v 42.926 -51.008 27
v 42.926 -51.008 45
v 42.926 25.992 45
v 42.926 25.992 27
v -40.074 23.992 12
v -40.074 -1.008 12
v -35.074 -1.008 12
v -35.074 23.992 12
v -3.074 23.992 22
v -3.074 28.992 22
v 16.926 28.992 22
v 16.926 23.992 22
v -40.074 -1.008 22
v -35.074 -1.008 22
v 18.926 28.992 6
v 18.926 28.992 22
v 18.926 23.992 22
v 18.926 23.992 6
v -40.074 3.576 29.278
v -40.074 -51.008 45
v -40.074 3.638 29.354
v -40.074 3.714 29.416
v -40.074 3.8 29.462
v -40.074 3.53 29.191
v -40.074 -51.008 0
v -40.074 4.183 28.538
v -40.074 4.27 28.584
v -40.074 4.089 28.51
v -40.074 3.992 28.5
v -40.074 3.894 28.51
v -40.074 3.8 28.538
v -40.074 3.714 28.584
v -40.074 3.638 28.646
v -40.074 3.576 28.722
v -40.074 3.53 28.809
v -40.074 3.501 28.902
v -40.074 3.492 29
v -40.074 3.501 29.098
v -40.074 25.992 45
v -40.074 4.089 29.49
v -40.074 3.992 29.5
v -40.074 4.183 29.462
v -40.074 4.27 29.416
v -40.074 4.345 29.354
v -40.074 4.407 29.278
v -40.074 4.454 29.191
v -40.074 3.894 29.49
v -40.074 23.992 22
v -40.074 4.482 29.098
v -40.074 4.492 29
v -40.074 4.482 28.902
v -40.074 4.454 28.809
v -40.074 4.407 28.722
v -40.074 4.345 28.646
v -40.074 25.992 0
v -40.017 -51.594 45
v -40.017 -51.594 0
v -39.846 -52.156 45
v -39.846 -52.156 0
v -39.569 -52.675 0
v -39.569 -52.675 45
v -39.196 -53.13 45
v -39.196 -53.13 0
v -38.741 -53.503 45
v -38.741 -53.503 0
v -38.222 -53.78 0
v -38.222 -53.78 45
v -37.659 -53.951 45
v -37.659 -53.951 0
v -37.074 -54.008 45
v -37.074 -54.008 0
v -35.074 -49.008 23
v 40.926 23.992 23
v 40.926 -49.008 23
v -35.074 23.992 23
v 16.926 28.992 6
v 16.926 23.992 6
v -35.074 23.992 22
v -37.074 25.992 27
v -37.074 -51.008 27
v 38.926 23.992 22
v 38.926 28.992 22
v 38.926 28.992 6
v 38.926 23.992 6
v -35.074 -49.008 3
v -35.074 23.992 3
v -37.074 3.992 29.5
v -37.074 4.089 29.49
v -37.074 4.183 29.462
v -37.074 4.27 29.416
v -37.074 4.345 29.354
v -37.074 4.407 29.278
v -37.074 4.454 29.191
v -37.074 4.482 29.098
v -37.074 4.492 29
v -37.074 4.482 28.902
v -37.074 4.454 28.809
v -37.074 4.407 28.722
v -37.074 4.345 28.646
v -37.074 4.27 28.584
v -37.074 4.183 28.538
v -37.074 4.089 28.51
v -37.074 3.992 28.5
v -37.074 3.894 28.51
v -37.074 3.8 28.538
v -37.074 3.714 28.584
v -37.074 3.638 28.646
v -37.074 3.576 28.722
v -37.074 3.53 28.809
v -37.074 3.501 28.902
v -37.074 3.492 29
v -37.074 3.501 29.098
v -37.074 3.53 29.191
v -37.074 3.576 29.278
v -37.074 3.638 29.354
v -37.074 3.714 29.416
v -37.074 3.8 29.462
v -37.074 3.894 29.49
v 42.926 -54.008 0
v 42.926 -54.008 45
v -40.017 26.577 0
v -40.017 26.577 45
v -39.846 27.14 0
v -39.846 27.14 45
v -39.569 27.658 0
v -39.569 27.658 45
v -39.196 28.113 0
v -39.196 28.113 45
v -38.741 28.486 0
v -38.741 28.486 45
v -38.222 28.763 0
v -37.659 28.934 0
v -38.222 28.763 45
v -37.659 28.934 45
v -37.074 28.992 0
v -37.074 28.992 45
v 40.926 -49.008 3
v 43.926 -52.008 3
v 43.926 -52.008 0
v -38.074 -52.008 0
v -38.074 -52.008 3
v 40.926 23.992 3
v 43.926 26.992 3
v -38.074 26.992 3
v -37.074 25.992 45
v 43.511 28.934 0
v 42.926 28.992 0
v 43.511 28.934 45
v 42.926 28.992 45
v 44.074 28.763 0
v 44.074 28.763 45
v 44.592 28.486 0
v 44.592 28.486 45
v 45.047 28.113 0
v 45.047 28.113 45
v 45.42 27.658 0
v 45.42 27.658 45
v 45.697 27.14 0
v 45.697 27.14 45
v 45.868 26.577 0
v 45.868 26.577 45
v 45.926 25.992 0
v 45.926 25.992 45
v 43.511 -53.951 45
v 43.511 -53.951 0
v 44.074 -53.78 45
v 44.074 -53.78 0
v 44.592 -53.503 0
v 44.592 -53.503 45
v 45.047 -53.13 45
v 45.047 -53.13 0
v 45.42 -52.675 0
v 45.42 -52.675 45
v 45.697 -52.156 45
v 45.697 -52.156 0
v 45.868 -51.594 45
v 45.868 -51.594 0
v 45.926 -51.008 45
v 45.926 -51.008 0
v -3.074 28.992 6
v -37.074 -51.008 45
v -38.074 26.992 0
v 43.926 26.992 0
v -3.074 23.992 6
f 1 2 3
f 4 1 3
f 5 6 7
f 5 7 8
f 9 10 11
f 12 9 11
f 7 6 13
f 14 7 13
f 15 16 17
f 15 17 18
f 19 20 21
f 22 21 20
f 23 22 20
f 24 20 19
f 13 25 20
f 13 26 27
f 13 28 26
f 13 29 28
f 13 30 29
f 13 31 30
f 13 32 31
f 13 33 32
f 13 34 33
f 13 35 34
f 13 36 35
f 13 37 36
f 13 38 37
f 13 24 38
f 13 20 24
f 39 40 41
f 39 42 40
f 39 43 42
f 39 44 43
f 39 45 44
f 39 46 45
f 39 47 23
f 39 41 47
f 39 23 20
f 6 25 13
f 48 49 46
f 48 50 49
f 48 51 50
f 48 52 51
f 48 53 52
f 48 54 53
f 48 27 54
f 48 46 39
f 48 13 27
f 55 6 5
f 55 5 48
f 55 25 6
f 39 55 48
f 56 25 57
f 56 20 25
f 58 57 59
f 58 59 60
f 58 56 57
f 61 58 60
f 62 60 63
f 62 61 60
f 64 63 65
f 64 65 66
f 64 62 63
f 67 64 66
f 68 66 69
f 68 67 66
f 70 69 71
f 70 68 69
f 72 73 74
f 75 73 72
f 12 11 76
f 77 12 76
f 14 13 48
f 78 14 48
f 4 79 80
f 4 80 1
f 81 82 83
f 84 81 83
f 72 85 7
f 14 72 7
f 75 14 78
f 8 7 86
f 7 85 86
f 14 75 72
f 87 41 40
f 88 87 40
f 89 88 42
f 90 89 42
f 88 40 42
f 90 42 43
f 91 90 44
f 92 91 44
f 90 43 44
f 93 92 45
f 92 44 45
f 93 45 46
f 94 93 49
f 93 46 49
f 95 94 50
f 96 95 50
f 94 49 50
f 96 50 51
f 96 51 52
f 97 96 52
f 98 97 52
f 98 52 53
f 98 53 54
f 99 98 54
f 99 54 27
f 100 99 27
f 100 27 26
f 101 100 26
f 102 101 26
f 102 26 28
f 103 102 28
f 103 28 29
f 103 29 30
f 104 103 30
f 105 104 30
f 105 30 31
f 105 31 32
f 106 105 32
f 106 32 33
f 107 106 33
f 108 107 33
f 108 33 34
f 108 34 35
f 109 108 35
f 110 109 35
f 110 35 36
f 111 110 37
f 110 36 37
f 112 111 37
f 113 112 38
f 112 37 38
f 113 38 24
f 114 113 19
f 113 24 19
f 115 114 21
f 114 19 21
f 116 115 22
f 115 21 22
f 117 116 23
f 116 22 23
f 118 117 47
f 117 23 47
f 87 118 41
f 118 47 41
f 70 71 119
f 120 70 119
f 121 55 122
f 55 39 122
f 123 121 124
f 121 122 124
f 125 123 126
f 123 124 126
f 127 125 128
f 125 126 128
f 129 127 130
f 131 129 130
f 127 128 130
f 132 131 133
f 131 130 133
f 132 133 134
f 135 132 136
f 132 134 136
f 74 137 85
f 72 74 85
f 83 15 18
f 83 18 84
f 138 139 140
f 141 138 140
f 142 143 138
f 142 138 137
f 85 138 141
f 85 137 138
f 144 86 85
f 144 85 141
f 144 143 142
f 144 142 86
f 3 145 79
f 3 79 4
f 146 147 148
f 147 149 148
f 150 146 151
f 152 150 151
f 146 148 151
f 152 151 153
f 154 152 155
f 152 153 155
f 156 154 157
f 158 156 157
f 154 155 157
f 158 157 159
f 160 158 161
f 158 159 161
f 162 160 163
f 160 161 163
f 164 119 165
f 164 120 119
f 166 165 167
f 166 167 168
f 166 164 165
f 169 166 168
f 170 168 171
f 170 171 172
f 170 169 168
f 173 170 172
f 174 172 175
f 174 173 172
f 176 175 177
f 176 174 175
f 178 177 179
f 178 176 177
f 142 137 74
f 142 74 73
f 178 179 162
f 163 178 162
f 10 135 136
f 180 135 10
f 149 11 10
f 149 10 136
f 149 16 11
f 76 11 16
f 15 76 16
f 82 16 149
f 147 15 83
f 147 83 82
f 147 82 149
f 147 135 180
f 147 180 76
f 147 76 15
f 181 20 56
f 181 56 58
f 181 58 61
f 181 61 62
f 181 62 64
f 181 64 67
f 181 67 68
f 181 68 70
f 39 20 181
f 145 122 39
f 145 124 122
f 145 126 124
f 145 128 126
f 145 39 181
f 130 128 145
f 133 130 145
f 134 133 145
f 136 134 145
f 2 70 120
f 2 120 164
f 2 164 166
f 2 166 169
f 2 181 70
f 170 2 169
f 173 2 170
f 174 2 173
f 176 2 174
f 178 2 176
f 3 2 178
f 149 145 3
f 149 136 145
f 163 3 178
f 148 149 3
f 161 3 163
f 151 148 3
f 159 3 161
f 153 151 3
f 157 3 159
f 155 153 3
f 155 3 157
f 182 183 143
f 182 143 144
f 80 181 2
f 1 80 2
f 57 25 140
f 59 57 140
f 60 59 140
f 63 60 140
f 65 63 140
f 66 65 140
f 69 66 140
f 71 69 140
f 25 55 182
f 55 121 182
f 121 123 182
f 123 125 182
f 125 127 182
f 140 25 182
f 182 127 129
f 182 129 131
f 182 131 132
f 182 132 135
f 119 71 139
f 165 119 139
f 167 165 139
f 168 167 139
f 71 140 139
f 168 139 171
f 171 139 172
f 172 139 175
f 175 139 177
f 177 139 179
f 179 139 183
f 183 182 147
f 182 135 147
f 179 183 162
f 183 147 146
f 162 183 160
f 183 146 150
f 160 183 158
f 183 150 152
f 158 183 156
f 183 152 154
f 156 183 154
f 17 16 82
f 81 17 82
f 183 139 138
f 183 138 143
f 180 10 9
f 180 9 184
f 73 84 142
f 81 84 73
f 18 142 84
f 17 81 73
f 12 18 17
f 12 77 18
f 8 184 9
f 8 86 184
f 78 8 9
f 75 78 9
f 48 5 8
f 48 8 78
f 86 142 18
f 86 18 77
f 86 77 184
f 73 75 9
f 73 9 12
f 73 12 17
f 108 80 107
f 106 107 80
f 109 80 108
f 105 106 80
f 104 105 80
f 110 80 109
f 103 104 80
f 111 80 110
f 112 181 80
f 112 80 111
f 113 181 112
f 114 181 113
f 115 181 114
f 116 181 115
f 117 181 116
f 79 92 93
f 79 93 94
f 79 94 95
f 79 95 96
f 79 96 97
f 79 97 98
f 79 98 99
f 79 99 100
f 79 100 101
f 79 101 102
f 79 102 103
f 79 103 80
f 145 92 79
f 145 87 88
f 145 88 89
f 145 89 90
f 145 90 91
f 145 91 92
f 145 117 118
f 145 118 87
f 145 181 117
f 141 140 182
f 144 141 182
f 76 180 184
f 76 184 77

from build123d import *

# Parameters (mm, degrees)
ESQUISSE1_W             = 86
ESQUISSE1_H             = 83
BOSS_EXTRU_1_DEPTH      = 45
ESQUISSE2_W             = 82
ESQUISSE2_H             = 79
ENL_V_MAT_EXTRU_1_DEPTH = 3
ESQUISSE3_W             = 76
ESQUISSE3_H             = 73
ENL_V_MAT_EXTRU_2_DEPTH = 20
ESQUISSE5_W             = 80
ESQUISSE5_H             = 77
ENL_V_MAT_EXTRU_3_DEPTH = 18
ESQUISSE7_W             = 20
ESQUISSE7_H             = 16
ENL_V_MAT_EXTRU_4_DEPTH = 18
ESQUISSE8_W             = 20
ESQUISSE8_H             = 16
ENL_V_MAT_EXTRU_5_DEPTH = 18
ESQUISSE10_W            = 10
ESQUISSE10_H            = 25
ENL_V_MAT_EXTRU_6_DEPTH = 18
ESQUISSE12_R            = 0.5
ENL_V_MAT_EXTRU_9_DEPTH = 18
CONG_2_R                = 3


with BuildPart() as part:
    # Esquisse1 → Boss.-Extru.1 (new body)
    with BuildSketch(Plane.XY):
        with Locations((2.925773196, -12.508247423)):
            Rectangle(ESQUISSE1_W, ESQUISSE1_H)
    extrude(amount=BOSS_EXTRU_1_DEPTH)

    # Esquisse2 → Enlèv. mat.-Extru.1 (cut)
    with BuildSketch(Plane(origin=(0, 0, 0), x_dir=(-1, 0, 0), z_dir=(0, 0, -1))):
        with Locations((-2.925773196, -12.508247423)):
            Rectangle(ESQUISSE2_W, ESQUISSE2_H)
    extrude(amount=-ENL_V_MAT_EXTRU_1_DEPTH, mode=Mode.SUBTRACT)

    # Esquisse3 → Enlèv. mat.-Extru.2 (cut)
    with BuildSketch(Plane(origin=(0, 0, 3), x_dir=(-1, 0, 0), z_dir=(0, 0, -1))):
        with Locations((-2.925773196, -12.508247423)):
            Rectangle(ESQUISSE3_W, ESQUISSE3_H)
    extrude(amount=-ENL_V_MAT_EXTRU_2_DEPTH, mode=Mode.SUBTRACT)

    # Esquisse5 → Enlèv. mat.-Extru.3 (cut)
    with BuildSketch(Plane.XY.offset(45)):
        with Locations((2.925773196, -12.508247423)):
            Rectangle(ESQUISSE5_W, ESQUISSE5_H)
    extrude(amount=-ENL_V_MAT_EXTRU_3_DEPTH, mode=Mode.SUBTRACT)

    # Esquisse7 → Enlèv. mat.-Extru.4 (cut)
    with BuildSketch(Plane(origin=(0, 28.991752577, 0), x_dir=(1, 0, 0), z_dir=(0, 1, 0))):
        with Locations((28.925773196, -14)):
            Rectangle(ESQUISSE7_W, ESQUISSE7_H)
    extrude(amount=-ENL_V_MAT_EXTRU_4_DEPTH, mode=Mode.SUBTRACT)

    # Esquisse8 → Enlèv. mat.-Extru.5 (cut)
    with BuildSketch(Plane(origin=(0, 28.991752577, 0), x_dir=(1, 0, 0), z_dir=(0, 1, 0))):
        with Locations((6.925773196, -14)):
            Rectangle(ESQUISSE8_W, ESQUISSE8_H)
    extrude(amount=-ENL_V_MAT_EXTRU_5_DEPTH, mode=Mode.SUBTRACT)

    # Esquisse10 → Enlèv. mat.-Extru.6 (cut)
    with BuildSketch(Plane.ZY.offset(40.074226804)):
        with Locations((17, 11.491752577)):
            Rectangle(ESQUISSE10_W, ESQUISSE10_H)
    extrude(amount=-ENL_V_MAT_EXTRU_6_DEPTH, mode=Mode.SUBTRACT)

    # Esquisse12 → Enlèv. mat.-Extru.9 (cut)
    with BuildSketch(Plane.ZY.offset(40.074226804)):
        with Locations((29, 3.991752577)):
            Circle(ESQUISSE12_R)
    extrude(amount=-ENL_V_MAT_EXTRU_9_DEPTH, mode=Mode.SUBTRACT)

    # Congé2
    cong_2_edges = [part.edges().sort_by_distance(p)[0] for p in [
        (-40.074226804, 28.991752577, 22.5),
        (45.925773196, 28.991752577, 22.5),
        (45.925773196, -54.008247423, 22.5),
        (-40.074226804, -54.008247423, 22.5),
    ]]
    fillet(cong_2_edges, radius=CONG_2_R)


solid = part.part
